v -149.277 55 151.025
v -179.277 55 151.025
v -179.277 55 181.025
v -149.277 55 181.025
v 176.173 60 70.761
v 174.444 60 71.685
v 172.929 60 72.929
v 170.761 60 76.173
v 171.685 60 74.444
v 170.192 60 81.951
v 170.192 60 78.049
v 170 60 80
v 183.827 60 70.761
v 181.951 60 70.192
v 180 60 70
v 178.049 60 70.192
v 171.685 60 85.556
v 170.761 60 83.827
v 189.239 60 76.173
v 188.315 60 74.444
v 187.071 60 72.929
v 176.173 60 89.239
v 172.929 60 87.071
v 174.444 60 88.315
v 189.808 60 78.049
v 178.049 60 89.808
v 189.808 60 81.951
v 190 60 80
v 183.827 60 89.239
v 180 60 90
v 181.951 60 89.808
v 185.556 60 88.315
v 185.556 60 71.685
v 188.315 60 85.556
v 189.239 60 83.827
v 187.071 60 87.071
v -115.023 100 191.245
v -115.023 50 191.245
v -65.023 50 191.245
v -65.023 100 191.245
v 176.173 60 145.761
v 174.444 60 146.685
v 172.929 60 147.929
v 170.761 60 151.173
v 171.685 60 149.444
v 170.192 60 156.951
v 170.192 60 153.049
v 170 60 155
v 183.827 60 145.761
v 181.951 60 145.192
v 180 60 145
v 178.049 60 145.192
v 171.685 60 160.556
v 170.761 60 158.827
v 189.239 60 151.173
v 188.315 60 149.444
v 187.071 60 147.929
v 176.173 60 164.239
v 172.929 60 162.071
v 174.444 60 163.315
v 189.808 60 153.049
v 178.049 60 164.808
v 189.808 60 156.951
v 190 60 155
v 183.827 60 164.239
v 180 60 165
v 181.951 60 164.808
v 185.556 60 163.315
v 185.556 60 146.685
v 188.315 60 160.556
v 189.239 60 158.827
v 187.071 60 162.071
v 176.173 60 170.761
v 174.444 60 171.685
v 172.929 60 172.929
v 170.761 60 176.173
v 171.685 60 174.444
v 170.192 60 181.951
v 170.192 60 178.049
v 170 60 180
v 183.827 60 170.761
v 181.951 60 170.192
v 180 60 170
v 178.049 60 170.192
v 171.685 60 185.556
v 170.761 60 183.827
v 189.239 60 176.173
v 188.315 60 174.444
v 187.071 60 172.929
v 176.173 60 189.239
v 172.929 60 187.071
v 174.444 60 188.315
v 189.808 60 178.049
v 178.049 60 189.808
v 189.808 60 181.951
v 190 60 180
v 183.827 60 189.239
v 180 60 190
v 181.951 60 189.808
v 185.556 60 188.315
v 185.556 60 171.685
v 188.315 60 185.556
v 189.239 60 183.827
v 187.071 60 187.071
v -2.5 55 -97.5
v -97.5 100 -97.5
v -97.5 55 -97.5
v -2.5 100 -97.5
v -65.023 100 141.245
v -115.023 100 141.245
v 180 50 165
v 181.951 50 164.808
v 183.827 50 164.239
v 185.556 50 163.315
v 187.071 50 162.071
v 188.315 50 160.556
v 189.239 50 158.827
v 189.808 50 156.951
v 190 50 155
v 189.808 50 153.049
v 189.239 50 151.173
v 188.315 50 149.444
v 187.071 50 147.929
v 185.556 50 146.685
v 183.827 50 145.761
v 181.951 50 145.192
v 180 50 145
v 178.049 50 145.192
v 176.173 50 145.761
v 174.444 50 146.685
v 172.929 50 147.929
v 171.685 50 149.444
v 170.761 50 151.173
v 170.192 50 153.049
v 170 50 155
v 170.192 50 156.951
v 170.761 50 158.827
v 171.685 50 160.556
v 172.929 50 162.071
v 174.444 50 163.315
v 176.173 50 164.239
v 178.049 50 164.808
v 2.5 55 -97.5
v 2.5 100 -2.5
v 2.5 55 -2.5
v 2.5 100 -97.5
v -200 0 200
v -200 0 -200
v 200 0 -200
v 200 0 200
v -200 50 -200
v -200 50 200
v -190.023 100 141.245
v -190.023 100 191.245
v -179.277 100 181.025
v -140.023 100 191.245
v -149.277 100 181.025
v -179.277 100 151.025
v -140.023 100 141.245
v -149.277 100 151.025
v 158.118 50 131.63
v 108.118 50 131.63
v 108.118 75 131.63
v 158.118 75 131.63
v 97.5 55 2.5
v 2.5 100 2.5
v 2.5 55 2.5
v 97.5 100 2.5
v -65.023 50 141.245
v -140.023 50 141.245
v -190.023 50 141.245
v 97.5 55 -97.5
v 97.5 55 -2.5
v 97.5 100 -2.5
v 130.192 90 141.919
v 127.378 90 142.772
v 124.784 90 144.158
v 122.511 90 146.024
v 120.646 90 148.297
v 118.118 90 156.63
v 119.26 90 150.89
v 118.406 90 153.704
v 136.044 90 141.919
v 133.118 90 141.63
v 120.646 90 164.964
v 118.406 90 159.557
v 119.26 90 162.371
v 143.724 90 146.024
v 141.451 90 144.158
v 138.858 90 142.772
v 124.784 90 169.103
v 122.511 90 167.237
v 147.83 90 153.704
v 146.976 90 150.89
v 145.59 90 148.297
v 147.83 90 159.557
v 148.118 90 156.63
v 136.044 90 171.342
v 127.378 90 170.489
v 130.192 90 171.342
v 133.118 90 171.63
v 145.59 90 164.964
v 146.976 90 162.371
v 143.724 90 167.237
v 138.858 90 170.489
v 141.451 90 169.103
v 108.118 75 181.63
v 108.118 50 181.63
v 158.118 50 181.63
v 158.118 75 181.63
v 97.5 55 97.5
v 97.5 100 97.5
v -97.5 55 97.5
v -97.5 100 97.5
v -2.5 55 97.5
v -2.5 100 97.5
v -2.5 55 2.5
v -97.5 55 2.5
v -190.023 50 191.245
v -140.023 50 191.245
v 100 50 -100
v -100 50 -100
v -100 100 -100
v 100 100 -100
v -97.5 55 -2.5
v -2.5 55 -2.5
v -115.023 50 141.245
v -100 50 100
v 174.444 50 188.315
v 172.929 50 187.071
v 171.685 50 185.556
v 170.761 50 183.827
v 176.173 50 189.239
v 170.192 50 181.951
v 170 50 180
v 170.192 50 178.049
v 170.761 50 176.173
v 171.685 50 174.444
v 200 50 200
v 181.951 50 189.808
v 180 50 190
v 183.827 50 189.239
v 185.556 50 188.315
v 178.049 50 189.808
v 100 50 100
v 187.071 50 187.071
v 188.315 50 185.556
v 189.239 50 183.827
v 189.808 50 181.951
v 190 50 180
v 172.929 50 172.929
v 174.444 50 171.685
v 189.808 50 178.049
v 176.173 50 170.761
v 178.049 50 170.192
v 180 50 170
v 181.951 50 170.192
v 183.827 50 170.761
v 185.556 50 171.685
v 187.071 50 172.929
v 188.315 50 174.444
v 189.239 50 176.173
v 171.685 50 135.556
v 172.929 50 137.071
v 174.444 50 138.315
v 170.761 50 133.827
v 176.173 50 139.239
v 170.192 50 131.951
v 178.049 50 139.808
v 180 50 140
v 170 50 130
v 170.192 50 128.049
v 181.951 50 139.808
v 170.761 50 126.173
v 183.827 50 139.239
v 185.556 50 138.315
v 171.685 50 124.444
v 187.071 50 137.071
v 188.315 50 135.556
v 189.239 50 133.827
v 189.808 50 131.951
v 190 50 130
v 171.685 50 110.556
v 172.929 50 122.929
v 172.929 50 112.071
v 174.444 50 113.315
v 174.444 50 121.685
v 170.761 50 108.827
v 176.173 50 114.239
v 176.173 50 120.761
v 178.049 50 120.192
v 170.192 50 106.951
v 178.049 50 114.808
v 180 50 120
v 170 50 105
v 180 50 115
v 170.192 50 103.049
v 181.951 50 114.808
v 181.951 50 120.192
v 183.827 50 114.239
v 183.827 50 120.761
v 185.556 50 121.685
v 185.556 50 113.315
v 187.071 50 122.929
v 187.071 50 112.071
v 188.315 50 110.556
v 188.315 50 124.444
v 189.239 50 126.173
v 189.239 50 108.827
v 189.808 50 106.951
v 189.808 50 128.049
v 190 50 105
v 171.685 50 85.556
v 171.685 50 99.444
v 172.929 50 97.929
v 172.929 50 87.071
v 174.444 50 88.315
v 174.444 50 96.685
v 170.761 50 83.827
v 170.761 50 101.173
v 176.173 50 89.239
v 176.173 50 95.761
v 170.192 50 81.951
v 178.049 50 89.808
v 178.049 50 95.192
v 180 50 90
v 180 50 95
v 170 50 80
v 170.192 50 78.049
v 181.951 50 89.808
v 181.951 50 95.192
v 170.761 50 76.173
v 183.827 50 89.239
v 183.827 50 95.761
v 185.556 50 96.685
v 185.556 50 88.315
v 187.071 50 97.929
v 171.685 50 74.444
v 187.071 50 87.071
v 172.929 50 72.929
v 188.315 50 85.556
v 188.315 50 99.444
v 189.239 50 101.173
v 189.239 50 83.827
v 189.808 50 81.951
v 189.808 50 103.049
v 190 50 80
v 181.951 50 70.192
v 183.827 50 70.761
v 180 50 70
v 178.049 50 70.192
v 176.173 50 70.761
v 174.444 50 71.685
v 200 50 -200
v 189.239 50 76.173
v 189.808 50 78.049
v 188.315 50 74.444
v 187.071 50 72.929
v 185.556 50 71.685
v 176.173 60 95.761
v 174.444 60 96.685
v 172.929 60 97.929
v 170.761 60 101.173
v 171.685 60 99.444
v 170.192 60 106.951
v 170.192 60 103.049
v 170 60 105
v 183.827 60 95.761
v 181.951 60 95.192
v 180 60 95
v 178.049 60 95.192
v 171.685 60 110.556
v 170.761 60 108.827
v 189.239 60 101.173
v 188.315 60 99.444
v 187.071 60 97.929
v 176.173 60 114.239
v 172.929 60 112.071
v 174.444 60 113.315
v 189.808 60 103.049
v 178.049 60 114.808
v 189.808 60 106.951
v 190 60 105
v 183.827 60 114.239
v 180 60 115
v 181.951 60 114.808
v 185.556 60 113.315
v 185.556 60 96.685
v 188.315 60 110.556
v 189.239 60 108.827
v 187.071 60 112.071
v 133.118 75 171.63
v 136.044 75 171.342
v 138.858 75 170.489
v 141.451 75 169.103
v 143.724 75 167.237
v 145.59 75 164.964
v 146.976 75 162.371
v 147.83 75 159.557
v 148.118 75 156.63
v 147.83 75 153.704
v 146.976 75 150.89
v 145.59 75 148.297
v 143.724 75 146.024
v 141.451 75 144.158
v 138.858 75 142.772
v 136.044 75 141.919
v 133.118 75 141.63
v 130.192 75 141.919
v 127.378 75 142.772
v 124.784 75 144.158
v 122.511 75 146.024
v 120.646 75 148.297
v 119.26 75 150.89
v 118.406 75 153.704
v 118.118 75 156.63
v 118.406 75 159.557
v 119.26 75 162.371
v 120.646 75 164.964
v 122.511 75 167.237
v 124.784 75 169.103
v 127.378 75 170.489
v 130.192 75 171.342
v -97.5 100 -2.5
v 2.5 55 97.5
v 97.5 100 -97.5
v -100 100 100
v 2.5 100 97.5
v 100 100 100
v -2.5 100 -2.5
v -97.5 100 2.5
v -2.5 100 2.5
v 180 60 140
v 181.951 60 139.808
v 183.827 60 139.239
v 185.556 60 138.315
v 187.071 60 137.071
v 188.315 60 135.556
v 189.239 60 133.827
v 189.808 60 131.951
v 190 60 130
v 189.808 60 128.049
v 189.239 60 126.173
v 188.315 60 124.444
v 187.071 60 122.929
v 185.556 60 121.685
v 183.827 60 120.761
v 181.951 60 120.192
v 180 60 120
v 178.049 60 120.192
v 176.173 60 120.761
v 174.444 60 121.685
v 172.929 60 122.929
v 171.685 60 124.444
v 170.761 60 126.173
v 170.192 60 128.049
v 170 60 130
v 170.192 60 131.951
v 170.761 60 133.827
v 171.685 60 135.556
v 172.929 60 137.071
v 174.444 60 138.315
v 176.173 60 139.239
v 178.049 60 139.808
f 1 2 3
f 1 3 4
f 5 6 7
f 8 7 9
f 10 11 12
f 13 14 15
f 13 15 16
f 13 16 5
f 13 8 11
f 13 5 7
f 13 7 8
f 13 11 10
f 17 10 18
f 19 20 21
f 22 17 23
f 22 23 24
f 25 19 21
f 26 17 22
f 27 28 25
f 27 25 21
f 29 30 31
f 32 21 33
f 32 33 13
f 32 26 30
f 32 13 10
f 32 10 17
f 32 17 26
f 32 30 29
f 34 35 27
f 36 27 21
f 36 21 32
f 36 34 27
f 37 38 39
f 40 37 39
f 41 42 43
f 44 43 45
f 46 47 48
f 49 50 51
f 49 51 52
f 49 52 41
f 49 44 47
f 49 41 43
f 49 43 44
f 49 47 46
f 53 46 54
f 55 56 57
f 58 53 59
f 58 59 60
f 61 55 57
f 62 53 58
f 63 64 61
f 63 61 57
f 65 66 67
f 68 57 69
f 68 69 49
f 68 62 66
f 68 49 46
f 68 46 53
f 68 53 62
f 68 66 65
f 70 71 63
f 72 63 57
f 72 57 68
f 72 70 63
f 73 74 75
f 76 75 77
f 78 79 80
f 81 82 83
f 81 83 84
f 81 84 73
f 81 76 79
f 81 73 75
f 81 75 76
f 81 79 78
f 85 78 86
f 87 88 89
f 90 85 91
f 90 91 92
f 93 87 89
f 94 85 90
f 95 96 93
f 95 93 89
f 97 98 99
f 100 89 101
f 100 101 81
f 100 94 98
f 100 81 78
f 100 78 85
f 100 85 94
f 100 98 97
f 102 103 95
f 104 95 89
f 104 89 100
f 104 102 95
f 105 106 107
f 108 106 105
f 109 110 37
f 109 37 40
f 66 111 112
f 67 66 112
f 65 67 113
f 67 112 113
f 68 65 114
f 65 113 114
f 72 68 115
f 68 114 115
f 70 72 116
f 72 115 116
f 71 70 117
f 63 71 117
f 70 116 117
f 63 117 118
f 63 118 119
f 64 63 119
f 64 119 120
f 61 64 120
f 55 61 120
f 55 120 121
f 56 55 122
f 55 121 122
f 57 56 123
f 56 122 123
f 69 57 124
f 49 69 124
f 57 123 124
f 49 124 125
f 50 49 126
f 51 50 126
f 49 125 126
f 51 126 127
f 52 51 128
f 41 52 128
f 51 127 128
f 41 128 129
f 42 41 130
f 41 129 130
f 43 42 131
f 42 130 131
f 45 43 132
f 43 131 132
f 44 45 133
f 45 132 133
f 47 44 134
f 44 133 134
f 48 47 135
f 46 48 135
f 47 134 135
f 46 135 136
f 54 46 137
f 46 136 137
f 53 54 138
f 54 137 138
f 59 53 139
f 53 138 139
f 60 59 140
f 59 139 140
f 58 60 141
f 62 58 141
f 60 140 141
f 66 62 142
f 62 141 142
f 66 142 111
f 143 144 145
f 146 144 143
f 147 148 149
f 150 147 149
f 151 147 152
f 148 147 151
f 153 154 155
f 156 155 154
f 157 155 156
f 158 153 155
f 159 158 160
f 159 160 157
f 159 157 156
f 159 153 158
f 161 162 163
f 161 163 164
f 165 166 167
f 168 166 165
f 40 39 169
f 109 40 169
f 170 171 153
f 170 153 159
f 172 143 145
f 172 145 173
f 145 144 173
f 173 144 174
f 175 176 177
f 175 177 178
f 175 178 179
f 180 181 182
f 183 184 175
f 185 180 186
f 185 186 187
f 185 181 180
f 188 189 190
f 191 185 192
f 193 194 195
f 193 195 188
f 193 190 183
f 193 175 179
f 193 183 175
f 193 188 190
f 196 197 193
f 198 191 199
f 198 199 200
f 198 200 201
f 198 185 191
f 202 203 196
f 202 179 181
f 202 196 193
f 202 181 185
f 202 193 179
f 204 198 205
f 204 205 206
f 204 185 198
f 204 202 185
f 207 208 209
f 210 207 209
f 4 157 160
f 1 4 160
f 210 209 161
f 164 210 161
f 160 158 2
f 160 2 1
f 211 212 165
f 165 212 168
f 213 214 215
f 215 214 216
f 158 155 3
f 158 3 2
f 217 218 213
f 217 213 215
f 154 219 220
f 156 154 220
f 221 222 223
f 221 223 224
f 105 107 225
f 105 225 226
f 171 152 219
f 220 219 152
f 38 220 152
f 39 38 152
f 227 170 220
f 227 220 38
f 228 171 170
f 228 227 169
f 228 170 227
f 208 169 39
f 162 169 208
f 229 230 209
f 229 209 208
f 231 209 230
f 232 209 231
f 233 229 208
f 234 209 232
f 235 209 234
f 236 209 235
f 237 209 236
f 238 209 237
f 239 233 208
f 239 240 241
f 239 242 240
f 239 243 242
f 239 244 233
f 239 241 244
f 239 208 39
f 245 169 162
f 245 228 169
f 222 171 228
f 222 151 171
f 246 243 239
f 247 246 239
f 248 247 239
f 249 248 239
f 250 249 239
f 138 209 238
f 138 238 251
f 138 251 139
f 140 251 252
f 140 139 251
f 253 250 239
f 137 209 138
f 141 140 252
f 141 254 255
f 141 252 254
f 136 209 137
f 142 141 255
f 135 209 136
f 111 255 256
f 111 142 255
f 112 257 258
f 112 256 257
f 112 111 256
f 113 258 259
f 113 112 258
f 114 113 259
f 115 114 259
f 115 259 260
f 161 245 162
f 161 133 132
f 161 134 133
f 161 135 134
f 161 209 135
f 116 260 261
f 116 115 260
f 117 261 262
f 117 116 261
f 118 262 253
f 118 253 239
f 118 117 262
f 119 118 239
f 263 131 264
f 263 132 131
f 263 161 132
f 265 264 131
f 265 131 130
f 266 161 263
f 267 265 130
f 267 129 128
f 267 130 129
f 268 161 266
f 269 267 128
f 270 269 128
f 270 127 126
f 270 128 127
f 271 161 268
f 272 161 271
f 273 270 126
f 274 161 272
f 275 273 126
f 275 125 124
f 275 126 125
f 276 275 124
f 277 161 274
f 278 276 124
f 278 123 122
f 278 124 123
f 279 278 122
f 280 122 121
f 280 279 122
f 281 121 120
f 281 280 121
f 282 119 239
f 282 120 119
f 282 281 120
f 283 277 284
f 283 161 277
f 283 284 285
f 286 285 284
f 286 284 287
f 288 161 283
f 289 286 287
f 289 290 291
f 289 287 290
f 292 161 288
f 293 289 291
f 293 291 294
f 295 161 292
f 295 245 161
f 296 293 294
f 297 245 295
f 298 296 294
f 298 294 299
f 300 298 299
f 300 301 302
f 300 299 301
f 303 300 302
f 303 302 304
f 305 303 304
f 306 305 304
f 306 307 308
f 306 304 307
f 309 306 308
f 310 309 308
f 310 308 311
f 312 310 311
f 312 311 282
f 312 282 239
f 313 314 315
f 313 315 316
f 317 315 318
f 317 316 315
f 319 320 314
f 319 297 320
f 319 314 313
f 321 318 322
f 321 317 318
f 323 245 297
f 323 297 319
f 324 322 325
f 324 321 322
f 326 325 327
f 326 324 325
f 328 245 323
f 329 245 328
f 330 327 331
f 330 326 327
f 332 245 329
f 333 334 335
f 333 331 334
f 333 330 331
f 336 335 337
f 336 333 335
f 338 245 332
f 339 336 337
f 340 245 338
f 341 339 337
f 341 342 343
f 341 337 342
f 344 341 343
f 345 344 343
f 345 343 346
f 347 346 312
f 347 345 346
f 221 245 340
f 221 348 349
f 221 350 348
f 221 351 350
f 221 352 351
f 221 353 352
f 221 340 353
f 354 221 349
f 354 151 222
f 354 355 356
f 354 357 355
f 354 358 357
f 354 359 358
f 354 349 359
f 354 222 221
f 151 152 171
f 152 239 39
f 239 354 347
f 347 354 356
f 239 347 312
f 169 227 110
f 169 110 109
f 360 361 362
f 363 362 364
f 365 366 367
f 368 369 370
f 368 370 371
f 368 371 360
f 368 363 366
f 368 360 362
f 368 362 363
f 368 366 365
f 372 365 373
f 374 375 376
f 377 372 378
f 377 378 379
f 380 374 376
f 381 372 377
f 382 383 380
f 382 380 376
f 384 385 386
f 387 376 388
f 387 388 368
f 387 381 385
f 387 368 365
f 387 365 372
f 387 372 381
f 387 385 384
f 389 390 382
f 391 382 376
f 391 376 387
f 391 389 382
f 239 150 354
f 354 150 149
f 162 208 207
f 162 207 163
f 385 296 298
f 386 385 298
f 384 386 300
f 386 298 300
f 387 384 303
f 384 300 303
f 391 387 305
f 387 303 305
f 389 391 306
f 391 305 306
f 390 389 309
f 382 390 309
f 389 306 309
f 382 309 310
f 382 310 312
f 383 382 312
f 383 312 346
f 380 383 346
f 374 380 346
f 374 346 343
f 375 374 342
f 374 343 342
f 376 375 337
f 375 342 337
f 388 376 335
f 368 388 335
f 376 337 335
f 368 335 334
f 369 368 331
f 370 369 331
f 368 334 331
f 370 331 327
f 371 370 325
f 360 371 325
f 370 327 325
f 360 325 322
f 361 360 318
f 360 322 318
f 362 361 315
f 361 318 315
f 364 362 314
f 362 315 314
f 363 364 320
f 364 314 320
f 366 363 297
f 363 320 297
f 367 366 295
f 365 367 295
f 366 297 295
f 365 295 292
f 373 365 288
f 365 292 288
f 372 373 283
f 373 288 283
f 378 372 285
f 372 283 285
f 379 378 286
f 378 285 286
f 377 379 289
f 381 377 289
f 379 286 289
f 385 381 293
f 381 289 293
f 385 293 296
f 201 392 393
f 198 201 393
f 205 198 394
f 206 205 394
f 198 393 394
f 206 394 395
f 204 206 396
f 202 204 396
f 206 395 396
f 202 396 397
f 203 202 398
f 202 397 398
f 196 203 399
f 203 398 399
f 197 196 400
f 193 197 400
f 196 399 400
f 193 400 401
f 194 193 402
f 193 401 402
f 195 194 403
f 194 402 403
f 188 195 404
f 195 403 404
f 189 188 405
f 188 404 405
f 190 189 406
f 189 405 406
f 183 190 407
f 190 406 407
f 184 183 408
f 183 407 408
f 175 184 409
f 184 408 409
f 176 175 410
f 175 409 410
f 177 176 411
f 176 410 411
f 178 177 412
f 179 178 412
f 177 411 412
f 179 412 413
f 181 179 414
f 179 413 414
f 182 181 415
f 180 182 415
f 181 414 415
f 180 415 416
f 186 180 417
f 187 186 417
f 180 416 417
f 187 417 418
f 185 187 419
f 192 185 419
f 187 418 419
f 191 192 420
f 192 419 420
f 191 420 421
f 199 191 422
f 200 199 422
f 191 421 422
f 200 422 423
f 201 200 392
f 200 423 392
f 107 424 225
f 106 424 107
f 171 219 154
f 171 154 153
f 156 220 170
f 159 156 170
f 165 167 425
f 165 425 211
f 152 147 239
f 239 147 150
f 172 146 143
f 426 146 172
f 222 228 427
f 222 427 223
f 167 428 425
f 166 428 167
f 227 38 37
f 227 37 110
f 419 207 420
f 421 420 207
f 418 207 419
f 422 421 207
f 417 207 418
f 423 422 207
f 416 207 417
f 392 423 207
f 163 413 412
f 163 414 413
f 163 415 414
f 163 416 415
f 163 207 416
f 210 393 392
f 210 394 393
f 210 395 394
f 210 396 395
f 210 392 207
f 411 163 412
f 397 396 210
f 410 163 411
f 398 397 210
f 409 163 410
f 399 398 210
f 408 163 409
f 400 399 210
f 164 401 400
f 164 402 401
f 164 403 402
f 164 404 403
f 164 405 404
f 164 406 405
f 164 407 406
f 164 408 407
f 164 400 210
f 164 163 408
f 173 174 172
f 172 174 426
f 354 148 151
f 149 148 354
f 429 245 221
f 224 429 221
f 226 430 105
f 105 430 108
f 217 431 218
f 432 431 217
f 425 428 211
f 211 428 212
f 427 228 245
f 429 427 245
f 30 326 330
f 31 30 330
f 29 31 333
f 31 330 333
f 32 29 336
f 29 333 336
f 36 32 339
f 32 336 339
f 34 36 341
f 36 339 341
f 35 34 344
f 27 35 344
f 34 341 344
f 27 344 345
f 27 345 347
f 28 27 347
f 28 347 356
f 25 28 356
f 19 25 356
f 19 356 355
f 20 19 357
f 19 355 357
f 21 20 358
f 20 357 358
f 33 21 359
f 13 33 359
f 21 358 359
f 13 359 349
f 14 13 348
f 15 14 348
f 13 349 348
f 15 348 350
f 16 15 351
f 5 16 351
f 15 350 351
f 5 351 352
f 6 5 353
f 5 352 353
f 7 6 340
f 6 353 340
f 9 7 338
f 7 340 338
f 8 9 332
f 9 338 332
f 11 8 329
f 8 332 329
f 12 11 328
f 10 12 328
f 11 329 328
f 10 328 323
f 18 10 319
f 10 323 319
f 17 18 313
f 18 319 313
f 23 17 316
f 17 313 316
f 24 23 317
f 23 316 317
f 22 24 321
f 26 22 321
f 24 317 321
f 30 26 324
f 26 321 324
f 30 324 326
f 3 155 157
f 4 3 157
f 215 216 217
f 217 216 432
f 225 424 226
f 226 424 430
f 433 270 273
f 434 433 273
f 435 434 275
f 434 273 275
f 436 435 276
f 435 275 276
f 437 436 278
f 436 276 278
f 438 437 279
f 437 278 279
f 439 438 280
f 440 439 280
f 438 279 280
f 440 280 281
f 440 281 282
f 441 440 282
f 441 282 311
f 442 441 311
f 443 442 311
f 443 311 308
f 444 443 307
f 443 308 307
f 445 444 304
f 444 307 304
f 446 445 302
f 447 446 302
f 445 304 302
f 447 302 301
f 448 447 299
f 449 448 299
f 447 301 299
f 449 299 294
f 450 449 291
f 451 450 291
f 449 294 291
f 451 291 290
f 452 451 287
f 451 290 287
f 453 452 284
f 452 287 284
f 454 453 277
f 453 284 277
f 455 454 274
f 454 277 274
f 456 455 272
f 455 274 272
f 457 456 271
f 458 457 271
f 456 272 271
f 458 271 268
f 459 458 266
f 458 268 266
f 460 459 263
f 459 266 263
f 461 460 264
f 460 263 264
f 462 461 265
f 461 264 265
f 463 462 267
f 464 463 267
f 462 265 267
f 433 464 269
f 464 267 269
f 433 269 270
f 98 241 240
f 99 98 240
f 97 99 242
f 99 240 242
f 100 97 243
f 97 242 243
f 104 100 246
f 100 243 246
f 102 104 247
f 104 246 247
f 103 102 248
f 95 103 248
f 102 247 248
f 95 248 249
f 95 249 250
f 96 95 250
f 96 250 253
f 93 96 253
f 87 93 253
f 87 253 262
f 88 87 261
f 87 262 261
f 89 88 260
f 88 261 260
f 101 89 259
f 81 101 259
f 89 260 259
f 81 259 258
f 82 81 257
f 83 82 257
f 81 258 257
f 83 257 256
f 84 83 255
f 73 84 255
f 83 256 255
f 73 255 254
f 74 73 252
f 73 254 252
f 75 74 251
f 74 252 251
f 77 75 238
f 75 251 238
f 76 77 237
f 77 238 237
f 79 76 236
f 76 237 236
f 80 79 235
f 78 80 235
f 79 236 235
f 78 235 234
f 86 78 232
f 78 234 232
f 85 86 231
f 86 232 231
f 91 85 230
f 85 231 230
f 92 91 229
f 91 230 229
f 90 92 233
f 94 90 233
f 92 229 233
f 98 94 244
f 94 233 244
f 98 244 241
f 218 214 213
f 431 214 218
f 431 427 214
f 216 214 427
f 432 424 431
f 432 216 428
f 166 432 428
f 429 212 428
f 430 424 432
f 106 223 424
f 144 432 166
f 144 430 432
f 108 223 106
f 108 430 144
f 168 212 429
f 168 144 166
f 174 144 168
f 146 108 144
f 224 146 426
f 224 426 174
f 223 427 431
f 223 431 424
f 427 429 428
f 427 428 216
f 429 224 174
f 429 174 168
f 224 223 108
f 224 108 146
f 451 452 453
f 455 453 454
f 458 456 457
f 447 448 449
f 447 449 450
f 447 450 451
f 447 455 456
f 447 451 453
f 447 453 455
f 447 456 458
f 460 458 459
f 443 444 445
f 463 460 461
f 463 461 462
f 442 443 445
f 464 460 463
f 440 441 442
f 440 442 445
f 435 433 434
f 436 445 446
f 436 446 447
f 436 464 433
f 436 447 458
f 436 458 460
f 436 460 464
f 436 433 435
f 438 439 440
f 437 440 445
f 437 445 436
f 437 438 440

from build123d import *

# Parameters (mm, degrees)
SKETCH1_W           = 400
SKETCH1_H           = 400
BOSS_EXTRUDE1_DEPTH = 50
SKETCH3_W           = 200
SKETCH3_H           = 200
BOSS_EXTRUDE2_DEPTH = 50
SKETCH4_W           = 95
SKETCH4_H           = 95
CUT_EXTRUDE1_DEPTH  = 45
SKETCH6_R           = 10
BOSS_EXTRUDE4_DEPTH = 10
LPATTERN3_COUNT     = 5
LPATTERN3_PITCH     = 25
SKETCH7_W           = 50
SKETCH7_H           = 50
BOSS_EXTRUDE5_DEPTH = 25
SKETCH8_R           = 15
BOSS_EXTRUDE6_DEPTH = 15
SKETCH10_W          = 50
SKETCH10_H          = 50
BOSS_EXTRUDE7_DEPTH = 50
SKETCH12_W          = 30
SKETCH12_H          = 30
CUT_EXTRUDE2_DEPTH  = 45
SKETCH13_W          = 50
SKETCH13_H          = 50
BOSS_EXTRUDE8_DEPTH = 50


with BuildPart() as part:
    # Sketch1 → Boss-Extrude1 (new body)
    with BuildSketch(Plane(origin=(0, 0, 0), x_dir=(1, 0, 0), z_dir=(0, 1, 0))):
        Rectangle(SKETCH1_W, SKETCH1_H)
    extrude(amount=BOSS_EXTRUDE1_DEPTH)

    # Sketch3 → Boss-Extrude2 (add)
    with BuildSketch(Plane(origin=(0, 50, 0), x_dir=(1, 0, 0), z_dir=(0, 1, 0))):
        Rectangle(SKETCH3_W, SKETCH3_H)
    extrude(amount=BOSS_EXTRUDE2_DEPTH)

    # Sketch4 → Cut-Extrude1 (cut)
    with BuildSketch(Plane(origin=(0, 100, 0), x_dir=(1, 0, 0), z_dir=(0, 1, 0))):
        with Locations((-50, -50)):
            Rectangle(SKETCH4_W, SKETCH4_H)
        with Locations((50, -50)):
            Rectangle(SKETCH4_W, SKETCH4_H)
        with Locations((-50, 50)):
            Rectangle(SKETCH4_W, SKETCH4_H)
        with Locations((50, 50)):
            Rectangle(SKETCH4_W, SKETCH4_H)
    extrude(amount=-CUT_EXTRUDE1_DEPTH, mode=Mode.SUBTRACT)

    # Sketch6 → Boss-Extrude4 (add)
    with BuildSketch(Plane(origin=(0, 50, 0), x_dir=(1, 0, 0), z_dir=(0, 1, 0))):
        with Locations((180, -180)):
            Circle(SKETCH6_R)
    boss_extrude4 = extrude(amount=BOSS_EXTRUDE4_DEPTH)

    # LPattern3: Boss-Extrude4 ×5
    with Locations(*[(0, 0, -i * LPATTERN3_PITCH) for i in range(1, LPATTERN3_COUNT)]):
        add(boss_extrude4)

    # Sketch7 → Boss-Extrude5 (add)
    with BuildSketch(Plane(origin=(0, 50, 0), x_dir=(1, 0, 0), z_dir=(0, 1, 0))):
        with Locations((133.117890176, -156.630485574)):
            Rectangle(SKETCH7_W, SKETCH7_H)
    extrude(amount=BOSS_EXTRUDE5_DEPTH)

    # Sketch8 → Boss-Extrude6 (add)
    with BuildSketch(Plane(origin=(0, 75, 0), x_dir=(1, 0, 0), z_dir=(0, 1, 0))):
        with Locations((133.117890176, -156.630485574)):
            Circle(SKETCH8_R)
    extrude(amount=BOSS_EXTRUDE6_DEPTH)

    # Sketch10 → Boss-Extrude7 (add)
    with BuildSketch(Plane(origin=(0, 50, 0), x_dir=(1, 0, 0), z_dir=(0, 1, 0))):
        with Locations((-165.022837079, -166.245313822)):
            Rectangle(SKETCH10_W, SKETCH10_H)
    extrude(amount=BOSS_EXTRUDE7_DEPTH)

    # Sketch12 → Cut-Extrude2 (cut)
    with BuildSketch(Plane(origin=(0, 100, 0), x_dir=(1, 0, 0), z_dir=(0, 1, 0))):
        with Locations((-164.276921981, -166.025383847)):
            Rectangle(SKETCH12_W, SKETCH12_H)
    extrude(amount=-CUT_EXTRUDE2_DEPTH, mode=Mode.SUBTRACT)

    # Sketch13 → Boss-Extrude8 (add)
    with BuildSketch(Plane(origin=(0, 50, 0), x_dir=(1, 0, 0), z_dir=(0, 1, 0))):
        with Locations((-90.022837079, -166.245313822)):
            Rectangle(SKETCH13_W, SKETCH13_H)
    extrude(amount=BOSS_EXTRUDE8_DEPTH)


solid = part.part
